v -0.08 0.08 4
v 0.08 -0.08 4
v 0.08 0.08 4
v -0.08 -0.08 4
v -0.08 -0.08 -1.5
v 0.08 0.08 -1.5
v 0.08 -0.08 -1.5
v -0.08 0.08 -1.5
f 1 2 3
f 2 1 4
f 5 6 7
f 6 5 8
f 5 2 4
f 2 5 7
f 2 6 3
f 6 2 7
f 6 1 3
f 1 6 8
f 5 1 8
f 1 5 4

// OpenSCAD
// Shed shell kit: corner outer. See lib/lodge_kit.scad.
include <lib/lodge_kit.scad>
kind = "shed";
corner_outer();
